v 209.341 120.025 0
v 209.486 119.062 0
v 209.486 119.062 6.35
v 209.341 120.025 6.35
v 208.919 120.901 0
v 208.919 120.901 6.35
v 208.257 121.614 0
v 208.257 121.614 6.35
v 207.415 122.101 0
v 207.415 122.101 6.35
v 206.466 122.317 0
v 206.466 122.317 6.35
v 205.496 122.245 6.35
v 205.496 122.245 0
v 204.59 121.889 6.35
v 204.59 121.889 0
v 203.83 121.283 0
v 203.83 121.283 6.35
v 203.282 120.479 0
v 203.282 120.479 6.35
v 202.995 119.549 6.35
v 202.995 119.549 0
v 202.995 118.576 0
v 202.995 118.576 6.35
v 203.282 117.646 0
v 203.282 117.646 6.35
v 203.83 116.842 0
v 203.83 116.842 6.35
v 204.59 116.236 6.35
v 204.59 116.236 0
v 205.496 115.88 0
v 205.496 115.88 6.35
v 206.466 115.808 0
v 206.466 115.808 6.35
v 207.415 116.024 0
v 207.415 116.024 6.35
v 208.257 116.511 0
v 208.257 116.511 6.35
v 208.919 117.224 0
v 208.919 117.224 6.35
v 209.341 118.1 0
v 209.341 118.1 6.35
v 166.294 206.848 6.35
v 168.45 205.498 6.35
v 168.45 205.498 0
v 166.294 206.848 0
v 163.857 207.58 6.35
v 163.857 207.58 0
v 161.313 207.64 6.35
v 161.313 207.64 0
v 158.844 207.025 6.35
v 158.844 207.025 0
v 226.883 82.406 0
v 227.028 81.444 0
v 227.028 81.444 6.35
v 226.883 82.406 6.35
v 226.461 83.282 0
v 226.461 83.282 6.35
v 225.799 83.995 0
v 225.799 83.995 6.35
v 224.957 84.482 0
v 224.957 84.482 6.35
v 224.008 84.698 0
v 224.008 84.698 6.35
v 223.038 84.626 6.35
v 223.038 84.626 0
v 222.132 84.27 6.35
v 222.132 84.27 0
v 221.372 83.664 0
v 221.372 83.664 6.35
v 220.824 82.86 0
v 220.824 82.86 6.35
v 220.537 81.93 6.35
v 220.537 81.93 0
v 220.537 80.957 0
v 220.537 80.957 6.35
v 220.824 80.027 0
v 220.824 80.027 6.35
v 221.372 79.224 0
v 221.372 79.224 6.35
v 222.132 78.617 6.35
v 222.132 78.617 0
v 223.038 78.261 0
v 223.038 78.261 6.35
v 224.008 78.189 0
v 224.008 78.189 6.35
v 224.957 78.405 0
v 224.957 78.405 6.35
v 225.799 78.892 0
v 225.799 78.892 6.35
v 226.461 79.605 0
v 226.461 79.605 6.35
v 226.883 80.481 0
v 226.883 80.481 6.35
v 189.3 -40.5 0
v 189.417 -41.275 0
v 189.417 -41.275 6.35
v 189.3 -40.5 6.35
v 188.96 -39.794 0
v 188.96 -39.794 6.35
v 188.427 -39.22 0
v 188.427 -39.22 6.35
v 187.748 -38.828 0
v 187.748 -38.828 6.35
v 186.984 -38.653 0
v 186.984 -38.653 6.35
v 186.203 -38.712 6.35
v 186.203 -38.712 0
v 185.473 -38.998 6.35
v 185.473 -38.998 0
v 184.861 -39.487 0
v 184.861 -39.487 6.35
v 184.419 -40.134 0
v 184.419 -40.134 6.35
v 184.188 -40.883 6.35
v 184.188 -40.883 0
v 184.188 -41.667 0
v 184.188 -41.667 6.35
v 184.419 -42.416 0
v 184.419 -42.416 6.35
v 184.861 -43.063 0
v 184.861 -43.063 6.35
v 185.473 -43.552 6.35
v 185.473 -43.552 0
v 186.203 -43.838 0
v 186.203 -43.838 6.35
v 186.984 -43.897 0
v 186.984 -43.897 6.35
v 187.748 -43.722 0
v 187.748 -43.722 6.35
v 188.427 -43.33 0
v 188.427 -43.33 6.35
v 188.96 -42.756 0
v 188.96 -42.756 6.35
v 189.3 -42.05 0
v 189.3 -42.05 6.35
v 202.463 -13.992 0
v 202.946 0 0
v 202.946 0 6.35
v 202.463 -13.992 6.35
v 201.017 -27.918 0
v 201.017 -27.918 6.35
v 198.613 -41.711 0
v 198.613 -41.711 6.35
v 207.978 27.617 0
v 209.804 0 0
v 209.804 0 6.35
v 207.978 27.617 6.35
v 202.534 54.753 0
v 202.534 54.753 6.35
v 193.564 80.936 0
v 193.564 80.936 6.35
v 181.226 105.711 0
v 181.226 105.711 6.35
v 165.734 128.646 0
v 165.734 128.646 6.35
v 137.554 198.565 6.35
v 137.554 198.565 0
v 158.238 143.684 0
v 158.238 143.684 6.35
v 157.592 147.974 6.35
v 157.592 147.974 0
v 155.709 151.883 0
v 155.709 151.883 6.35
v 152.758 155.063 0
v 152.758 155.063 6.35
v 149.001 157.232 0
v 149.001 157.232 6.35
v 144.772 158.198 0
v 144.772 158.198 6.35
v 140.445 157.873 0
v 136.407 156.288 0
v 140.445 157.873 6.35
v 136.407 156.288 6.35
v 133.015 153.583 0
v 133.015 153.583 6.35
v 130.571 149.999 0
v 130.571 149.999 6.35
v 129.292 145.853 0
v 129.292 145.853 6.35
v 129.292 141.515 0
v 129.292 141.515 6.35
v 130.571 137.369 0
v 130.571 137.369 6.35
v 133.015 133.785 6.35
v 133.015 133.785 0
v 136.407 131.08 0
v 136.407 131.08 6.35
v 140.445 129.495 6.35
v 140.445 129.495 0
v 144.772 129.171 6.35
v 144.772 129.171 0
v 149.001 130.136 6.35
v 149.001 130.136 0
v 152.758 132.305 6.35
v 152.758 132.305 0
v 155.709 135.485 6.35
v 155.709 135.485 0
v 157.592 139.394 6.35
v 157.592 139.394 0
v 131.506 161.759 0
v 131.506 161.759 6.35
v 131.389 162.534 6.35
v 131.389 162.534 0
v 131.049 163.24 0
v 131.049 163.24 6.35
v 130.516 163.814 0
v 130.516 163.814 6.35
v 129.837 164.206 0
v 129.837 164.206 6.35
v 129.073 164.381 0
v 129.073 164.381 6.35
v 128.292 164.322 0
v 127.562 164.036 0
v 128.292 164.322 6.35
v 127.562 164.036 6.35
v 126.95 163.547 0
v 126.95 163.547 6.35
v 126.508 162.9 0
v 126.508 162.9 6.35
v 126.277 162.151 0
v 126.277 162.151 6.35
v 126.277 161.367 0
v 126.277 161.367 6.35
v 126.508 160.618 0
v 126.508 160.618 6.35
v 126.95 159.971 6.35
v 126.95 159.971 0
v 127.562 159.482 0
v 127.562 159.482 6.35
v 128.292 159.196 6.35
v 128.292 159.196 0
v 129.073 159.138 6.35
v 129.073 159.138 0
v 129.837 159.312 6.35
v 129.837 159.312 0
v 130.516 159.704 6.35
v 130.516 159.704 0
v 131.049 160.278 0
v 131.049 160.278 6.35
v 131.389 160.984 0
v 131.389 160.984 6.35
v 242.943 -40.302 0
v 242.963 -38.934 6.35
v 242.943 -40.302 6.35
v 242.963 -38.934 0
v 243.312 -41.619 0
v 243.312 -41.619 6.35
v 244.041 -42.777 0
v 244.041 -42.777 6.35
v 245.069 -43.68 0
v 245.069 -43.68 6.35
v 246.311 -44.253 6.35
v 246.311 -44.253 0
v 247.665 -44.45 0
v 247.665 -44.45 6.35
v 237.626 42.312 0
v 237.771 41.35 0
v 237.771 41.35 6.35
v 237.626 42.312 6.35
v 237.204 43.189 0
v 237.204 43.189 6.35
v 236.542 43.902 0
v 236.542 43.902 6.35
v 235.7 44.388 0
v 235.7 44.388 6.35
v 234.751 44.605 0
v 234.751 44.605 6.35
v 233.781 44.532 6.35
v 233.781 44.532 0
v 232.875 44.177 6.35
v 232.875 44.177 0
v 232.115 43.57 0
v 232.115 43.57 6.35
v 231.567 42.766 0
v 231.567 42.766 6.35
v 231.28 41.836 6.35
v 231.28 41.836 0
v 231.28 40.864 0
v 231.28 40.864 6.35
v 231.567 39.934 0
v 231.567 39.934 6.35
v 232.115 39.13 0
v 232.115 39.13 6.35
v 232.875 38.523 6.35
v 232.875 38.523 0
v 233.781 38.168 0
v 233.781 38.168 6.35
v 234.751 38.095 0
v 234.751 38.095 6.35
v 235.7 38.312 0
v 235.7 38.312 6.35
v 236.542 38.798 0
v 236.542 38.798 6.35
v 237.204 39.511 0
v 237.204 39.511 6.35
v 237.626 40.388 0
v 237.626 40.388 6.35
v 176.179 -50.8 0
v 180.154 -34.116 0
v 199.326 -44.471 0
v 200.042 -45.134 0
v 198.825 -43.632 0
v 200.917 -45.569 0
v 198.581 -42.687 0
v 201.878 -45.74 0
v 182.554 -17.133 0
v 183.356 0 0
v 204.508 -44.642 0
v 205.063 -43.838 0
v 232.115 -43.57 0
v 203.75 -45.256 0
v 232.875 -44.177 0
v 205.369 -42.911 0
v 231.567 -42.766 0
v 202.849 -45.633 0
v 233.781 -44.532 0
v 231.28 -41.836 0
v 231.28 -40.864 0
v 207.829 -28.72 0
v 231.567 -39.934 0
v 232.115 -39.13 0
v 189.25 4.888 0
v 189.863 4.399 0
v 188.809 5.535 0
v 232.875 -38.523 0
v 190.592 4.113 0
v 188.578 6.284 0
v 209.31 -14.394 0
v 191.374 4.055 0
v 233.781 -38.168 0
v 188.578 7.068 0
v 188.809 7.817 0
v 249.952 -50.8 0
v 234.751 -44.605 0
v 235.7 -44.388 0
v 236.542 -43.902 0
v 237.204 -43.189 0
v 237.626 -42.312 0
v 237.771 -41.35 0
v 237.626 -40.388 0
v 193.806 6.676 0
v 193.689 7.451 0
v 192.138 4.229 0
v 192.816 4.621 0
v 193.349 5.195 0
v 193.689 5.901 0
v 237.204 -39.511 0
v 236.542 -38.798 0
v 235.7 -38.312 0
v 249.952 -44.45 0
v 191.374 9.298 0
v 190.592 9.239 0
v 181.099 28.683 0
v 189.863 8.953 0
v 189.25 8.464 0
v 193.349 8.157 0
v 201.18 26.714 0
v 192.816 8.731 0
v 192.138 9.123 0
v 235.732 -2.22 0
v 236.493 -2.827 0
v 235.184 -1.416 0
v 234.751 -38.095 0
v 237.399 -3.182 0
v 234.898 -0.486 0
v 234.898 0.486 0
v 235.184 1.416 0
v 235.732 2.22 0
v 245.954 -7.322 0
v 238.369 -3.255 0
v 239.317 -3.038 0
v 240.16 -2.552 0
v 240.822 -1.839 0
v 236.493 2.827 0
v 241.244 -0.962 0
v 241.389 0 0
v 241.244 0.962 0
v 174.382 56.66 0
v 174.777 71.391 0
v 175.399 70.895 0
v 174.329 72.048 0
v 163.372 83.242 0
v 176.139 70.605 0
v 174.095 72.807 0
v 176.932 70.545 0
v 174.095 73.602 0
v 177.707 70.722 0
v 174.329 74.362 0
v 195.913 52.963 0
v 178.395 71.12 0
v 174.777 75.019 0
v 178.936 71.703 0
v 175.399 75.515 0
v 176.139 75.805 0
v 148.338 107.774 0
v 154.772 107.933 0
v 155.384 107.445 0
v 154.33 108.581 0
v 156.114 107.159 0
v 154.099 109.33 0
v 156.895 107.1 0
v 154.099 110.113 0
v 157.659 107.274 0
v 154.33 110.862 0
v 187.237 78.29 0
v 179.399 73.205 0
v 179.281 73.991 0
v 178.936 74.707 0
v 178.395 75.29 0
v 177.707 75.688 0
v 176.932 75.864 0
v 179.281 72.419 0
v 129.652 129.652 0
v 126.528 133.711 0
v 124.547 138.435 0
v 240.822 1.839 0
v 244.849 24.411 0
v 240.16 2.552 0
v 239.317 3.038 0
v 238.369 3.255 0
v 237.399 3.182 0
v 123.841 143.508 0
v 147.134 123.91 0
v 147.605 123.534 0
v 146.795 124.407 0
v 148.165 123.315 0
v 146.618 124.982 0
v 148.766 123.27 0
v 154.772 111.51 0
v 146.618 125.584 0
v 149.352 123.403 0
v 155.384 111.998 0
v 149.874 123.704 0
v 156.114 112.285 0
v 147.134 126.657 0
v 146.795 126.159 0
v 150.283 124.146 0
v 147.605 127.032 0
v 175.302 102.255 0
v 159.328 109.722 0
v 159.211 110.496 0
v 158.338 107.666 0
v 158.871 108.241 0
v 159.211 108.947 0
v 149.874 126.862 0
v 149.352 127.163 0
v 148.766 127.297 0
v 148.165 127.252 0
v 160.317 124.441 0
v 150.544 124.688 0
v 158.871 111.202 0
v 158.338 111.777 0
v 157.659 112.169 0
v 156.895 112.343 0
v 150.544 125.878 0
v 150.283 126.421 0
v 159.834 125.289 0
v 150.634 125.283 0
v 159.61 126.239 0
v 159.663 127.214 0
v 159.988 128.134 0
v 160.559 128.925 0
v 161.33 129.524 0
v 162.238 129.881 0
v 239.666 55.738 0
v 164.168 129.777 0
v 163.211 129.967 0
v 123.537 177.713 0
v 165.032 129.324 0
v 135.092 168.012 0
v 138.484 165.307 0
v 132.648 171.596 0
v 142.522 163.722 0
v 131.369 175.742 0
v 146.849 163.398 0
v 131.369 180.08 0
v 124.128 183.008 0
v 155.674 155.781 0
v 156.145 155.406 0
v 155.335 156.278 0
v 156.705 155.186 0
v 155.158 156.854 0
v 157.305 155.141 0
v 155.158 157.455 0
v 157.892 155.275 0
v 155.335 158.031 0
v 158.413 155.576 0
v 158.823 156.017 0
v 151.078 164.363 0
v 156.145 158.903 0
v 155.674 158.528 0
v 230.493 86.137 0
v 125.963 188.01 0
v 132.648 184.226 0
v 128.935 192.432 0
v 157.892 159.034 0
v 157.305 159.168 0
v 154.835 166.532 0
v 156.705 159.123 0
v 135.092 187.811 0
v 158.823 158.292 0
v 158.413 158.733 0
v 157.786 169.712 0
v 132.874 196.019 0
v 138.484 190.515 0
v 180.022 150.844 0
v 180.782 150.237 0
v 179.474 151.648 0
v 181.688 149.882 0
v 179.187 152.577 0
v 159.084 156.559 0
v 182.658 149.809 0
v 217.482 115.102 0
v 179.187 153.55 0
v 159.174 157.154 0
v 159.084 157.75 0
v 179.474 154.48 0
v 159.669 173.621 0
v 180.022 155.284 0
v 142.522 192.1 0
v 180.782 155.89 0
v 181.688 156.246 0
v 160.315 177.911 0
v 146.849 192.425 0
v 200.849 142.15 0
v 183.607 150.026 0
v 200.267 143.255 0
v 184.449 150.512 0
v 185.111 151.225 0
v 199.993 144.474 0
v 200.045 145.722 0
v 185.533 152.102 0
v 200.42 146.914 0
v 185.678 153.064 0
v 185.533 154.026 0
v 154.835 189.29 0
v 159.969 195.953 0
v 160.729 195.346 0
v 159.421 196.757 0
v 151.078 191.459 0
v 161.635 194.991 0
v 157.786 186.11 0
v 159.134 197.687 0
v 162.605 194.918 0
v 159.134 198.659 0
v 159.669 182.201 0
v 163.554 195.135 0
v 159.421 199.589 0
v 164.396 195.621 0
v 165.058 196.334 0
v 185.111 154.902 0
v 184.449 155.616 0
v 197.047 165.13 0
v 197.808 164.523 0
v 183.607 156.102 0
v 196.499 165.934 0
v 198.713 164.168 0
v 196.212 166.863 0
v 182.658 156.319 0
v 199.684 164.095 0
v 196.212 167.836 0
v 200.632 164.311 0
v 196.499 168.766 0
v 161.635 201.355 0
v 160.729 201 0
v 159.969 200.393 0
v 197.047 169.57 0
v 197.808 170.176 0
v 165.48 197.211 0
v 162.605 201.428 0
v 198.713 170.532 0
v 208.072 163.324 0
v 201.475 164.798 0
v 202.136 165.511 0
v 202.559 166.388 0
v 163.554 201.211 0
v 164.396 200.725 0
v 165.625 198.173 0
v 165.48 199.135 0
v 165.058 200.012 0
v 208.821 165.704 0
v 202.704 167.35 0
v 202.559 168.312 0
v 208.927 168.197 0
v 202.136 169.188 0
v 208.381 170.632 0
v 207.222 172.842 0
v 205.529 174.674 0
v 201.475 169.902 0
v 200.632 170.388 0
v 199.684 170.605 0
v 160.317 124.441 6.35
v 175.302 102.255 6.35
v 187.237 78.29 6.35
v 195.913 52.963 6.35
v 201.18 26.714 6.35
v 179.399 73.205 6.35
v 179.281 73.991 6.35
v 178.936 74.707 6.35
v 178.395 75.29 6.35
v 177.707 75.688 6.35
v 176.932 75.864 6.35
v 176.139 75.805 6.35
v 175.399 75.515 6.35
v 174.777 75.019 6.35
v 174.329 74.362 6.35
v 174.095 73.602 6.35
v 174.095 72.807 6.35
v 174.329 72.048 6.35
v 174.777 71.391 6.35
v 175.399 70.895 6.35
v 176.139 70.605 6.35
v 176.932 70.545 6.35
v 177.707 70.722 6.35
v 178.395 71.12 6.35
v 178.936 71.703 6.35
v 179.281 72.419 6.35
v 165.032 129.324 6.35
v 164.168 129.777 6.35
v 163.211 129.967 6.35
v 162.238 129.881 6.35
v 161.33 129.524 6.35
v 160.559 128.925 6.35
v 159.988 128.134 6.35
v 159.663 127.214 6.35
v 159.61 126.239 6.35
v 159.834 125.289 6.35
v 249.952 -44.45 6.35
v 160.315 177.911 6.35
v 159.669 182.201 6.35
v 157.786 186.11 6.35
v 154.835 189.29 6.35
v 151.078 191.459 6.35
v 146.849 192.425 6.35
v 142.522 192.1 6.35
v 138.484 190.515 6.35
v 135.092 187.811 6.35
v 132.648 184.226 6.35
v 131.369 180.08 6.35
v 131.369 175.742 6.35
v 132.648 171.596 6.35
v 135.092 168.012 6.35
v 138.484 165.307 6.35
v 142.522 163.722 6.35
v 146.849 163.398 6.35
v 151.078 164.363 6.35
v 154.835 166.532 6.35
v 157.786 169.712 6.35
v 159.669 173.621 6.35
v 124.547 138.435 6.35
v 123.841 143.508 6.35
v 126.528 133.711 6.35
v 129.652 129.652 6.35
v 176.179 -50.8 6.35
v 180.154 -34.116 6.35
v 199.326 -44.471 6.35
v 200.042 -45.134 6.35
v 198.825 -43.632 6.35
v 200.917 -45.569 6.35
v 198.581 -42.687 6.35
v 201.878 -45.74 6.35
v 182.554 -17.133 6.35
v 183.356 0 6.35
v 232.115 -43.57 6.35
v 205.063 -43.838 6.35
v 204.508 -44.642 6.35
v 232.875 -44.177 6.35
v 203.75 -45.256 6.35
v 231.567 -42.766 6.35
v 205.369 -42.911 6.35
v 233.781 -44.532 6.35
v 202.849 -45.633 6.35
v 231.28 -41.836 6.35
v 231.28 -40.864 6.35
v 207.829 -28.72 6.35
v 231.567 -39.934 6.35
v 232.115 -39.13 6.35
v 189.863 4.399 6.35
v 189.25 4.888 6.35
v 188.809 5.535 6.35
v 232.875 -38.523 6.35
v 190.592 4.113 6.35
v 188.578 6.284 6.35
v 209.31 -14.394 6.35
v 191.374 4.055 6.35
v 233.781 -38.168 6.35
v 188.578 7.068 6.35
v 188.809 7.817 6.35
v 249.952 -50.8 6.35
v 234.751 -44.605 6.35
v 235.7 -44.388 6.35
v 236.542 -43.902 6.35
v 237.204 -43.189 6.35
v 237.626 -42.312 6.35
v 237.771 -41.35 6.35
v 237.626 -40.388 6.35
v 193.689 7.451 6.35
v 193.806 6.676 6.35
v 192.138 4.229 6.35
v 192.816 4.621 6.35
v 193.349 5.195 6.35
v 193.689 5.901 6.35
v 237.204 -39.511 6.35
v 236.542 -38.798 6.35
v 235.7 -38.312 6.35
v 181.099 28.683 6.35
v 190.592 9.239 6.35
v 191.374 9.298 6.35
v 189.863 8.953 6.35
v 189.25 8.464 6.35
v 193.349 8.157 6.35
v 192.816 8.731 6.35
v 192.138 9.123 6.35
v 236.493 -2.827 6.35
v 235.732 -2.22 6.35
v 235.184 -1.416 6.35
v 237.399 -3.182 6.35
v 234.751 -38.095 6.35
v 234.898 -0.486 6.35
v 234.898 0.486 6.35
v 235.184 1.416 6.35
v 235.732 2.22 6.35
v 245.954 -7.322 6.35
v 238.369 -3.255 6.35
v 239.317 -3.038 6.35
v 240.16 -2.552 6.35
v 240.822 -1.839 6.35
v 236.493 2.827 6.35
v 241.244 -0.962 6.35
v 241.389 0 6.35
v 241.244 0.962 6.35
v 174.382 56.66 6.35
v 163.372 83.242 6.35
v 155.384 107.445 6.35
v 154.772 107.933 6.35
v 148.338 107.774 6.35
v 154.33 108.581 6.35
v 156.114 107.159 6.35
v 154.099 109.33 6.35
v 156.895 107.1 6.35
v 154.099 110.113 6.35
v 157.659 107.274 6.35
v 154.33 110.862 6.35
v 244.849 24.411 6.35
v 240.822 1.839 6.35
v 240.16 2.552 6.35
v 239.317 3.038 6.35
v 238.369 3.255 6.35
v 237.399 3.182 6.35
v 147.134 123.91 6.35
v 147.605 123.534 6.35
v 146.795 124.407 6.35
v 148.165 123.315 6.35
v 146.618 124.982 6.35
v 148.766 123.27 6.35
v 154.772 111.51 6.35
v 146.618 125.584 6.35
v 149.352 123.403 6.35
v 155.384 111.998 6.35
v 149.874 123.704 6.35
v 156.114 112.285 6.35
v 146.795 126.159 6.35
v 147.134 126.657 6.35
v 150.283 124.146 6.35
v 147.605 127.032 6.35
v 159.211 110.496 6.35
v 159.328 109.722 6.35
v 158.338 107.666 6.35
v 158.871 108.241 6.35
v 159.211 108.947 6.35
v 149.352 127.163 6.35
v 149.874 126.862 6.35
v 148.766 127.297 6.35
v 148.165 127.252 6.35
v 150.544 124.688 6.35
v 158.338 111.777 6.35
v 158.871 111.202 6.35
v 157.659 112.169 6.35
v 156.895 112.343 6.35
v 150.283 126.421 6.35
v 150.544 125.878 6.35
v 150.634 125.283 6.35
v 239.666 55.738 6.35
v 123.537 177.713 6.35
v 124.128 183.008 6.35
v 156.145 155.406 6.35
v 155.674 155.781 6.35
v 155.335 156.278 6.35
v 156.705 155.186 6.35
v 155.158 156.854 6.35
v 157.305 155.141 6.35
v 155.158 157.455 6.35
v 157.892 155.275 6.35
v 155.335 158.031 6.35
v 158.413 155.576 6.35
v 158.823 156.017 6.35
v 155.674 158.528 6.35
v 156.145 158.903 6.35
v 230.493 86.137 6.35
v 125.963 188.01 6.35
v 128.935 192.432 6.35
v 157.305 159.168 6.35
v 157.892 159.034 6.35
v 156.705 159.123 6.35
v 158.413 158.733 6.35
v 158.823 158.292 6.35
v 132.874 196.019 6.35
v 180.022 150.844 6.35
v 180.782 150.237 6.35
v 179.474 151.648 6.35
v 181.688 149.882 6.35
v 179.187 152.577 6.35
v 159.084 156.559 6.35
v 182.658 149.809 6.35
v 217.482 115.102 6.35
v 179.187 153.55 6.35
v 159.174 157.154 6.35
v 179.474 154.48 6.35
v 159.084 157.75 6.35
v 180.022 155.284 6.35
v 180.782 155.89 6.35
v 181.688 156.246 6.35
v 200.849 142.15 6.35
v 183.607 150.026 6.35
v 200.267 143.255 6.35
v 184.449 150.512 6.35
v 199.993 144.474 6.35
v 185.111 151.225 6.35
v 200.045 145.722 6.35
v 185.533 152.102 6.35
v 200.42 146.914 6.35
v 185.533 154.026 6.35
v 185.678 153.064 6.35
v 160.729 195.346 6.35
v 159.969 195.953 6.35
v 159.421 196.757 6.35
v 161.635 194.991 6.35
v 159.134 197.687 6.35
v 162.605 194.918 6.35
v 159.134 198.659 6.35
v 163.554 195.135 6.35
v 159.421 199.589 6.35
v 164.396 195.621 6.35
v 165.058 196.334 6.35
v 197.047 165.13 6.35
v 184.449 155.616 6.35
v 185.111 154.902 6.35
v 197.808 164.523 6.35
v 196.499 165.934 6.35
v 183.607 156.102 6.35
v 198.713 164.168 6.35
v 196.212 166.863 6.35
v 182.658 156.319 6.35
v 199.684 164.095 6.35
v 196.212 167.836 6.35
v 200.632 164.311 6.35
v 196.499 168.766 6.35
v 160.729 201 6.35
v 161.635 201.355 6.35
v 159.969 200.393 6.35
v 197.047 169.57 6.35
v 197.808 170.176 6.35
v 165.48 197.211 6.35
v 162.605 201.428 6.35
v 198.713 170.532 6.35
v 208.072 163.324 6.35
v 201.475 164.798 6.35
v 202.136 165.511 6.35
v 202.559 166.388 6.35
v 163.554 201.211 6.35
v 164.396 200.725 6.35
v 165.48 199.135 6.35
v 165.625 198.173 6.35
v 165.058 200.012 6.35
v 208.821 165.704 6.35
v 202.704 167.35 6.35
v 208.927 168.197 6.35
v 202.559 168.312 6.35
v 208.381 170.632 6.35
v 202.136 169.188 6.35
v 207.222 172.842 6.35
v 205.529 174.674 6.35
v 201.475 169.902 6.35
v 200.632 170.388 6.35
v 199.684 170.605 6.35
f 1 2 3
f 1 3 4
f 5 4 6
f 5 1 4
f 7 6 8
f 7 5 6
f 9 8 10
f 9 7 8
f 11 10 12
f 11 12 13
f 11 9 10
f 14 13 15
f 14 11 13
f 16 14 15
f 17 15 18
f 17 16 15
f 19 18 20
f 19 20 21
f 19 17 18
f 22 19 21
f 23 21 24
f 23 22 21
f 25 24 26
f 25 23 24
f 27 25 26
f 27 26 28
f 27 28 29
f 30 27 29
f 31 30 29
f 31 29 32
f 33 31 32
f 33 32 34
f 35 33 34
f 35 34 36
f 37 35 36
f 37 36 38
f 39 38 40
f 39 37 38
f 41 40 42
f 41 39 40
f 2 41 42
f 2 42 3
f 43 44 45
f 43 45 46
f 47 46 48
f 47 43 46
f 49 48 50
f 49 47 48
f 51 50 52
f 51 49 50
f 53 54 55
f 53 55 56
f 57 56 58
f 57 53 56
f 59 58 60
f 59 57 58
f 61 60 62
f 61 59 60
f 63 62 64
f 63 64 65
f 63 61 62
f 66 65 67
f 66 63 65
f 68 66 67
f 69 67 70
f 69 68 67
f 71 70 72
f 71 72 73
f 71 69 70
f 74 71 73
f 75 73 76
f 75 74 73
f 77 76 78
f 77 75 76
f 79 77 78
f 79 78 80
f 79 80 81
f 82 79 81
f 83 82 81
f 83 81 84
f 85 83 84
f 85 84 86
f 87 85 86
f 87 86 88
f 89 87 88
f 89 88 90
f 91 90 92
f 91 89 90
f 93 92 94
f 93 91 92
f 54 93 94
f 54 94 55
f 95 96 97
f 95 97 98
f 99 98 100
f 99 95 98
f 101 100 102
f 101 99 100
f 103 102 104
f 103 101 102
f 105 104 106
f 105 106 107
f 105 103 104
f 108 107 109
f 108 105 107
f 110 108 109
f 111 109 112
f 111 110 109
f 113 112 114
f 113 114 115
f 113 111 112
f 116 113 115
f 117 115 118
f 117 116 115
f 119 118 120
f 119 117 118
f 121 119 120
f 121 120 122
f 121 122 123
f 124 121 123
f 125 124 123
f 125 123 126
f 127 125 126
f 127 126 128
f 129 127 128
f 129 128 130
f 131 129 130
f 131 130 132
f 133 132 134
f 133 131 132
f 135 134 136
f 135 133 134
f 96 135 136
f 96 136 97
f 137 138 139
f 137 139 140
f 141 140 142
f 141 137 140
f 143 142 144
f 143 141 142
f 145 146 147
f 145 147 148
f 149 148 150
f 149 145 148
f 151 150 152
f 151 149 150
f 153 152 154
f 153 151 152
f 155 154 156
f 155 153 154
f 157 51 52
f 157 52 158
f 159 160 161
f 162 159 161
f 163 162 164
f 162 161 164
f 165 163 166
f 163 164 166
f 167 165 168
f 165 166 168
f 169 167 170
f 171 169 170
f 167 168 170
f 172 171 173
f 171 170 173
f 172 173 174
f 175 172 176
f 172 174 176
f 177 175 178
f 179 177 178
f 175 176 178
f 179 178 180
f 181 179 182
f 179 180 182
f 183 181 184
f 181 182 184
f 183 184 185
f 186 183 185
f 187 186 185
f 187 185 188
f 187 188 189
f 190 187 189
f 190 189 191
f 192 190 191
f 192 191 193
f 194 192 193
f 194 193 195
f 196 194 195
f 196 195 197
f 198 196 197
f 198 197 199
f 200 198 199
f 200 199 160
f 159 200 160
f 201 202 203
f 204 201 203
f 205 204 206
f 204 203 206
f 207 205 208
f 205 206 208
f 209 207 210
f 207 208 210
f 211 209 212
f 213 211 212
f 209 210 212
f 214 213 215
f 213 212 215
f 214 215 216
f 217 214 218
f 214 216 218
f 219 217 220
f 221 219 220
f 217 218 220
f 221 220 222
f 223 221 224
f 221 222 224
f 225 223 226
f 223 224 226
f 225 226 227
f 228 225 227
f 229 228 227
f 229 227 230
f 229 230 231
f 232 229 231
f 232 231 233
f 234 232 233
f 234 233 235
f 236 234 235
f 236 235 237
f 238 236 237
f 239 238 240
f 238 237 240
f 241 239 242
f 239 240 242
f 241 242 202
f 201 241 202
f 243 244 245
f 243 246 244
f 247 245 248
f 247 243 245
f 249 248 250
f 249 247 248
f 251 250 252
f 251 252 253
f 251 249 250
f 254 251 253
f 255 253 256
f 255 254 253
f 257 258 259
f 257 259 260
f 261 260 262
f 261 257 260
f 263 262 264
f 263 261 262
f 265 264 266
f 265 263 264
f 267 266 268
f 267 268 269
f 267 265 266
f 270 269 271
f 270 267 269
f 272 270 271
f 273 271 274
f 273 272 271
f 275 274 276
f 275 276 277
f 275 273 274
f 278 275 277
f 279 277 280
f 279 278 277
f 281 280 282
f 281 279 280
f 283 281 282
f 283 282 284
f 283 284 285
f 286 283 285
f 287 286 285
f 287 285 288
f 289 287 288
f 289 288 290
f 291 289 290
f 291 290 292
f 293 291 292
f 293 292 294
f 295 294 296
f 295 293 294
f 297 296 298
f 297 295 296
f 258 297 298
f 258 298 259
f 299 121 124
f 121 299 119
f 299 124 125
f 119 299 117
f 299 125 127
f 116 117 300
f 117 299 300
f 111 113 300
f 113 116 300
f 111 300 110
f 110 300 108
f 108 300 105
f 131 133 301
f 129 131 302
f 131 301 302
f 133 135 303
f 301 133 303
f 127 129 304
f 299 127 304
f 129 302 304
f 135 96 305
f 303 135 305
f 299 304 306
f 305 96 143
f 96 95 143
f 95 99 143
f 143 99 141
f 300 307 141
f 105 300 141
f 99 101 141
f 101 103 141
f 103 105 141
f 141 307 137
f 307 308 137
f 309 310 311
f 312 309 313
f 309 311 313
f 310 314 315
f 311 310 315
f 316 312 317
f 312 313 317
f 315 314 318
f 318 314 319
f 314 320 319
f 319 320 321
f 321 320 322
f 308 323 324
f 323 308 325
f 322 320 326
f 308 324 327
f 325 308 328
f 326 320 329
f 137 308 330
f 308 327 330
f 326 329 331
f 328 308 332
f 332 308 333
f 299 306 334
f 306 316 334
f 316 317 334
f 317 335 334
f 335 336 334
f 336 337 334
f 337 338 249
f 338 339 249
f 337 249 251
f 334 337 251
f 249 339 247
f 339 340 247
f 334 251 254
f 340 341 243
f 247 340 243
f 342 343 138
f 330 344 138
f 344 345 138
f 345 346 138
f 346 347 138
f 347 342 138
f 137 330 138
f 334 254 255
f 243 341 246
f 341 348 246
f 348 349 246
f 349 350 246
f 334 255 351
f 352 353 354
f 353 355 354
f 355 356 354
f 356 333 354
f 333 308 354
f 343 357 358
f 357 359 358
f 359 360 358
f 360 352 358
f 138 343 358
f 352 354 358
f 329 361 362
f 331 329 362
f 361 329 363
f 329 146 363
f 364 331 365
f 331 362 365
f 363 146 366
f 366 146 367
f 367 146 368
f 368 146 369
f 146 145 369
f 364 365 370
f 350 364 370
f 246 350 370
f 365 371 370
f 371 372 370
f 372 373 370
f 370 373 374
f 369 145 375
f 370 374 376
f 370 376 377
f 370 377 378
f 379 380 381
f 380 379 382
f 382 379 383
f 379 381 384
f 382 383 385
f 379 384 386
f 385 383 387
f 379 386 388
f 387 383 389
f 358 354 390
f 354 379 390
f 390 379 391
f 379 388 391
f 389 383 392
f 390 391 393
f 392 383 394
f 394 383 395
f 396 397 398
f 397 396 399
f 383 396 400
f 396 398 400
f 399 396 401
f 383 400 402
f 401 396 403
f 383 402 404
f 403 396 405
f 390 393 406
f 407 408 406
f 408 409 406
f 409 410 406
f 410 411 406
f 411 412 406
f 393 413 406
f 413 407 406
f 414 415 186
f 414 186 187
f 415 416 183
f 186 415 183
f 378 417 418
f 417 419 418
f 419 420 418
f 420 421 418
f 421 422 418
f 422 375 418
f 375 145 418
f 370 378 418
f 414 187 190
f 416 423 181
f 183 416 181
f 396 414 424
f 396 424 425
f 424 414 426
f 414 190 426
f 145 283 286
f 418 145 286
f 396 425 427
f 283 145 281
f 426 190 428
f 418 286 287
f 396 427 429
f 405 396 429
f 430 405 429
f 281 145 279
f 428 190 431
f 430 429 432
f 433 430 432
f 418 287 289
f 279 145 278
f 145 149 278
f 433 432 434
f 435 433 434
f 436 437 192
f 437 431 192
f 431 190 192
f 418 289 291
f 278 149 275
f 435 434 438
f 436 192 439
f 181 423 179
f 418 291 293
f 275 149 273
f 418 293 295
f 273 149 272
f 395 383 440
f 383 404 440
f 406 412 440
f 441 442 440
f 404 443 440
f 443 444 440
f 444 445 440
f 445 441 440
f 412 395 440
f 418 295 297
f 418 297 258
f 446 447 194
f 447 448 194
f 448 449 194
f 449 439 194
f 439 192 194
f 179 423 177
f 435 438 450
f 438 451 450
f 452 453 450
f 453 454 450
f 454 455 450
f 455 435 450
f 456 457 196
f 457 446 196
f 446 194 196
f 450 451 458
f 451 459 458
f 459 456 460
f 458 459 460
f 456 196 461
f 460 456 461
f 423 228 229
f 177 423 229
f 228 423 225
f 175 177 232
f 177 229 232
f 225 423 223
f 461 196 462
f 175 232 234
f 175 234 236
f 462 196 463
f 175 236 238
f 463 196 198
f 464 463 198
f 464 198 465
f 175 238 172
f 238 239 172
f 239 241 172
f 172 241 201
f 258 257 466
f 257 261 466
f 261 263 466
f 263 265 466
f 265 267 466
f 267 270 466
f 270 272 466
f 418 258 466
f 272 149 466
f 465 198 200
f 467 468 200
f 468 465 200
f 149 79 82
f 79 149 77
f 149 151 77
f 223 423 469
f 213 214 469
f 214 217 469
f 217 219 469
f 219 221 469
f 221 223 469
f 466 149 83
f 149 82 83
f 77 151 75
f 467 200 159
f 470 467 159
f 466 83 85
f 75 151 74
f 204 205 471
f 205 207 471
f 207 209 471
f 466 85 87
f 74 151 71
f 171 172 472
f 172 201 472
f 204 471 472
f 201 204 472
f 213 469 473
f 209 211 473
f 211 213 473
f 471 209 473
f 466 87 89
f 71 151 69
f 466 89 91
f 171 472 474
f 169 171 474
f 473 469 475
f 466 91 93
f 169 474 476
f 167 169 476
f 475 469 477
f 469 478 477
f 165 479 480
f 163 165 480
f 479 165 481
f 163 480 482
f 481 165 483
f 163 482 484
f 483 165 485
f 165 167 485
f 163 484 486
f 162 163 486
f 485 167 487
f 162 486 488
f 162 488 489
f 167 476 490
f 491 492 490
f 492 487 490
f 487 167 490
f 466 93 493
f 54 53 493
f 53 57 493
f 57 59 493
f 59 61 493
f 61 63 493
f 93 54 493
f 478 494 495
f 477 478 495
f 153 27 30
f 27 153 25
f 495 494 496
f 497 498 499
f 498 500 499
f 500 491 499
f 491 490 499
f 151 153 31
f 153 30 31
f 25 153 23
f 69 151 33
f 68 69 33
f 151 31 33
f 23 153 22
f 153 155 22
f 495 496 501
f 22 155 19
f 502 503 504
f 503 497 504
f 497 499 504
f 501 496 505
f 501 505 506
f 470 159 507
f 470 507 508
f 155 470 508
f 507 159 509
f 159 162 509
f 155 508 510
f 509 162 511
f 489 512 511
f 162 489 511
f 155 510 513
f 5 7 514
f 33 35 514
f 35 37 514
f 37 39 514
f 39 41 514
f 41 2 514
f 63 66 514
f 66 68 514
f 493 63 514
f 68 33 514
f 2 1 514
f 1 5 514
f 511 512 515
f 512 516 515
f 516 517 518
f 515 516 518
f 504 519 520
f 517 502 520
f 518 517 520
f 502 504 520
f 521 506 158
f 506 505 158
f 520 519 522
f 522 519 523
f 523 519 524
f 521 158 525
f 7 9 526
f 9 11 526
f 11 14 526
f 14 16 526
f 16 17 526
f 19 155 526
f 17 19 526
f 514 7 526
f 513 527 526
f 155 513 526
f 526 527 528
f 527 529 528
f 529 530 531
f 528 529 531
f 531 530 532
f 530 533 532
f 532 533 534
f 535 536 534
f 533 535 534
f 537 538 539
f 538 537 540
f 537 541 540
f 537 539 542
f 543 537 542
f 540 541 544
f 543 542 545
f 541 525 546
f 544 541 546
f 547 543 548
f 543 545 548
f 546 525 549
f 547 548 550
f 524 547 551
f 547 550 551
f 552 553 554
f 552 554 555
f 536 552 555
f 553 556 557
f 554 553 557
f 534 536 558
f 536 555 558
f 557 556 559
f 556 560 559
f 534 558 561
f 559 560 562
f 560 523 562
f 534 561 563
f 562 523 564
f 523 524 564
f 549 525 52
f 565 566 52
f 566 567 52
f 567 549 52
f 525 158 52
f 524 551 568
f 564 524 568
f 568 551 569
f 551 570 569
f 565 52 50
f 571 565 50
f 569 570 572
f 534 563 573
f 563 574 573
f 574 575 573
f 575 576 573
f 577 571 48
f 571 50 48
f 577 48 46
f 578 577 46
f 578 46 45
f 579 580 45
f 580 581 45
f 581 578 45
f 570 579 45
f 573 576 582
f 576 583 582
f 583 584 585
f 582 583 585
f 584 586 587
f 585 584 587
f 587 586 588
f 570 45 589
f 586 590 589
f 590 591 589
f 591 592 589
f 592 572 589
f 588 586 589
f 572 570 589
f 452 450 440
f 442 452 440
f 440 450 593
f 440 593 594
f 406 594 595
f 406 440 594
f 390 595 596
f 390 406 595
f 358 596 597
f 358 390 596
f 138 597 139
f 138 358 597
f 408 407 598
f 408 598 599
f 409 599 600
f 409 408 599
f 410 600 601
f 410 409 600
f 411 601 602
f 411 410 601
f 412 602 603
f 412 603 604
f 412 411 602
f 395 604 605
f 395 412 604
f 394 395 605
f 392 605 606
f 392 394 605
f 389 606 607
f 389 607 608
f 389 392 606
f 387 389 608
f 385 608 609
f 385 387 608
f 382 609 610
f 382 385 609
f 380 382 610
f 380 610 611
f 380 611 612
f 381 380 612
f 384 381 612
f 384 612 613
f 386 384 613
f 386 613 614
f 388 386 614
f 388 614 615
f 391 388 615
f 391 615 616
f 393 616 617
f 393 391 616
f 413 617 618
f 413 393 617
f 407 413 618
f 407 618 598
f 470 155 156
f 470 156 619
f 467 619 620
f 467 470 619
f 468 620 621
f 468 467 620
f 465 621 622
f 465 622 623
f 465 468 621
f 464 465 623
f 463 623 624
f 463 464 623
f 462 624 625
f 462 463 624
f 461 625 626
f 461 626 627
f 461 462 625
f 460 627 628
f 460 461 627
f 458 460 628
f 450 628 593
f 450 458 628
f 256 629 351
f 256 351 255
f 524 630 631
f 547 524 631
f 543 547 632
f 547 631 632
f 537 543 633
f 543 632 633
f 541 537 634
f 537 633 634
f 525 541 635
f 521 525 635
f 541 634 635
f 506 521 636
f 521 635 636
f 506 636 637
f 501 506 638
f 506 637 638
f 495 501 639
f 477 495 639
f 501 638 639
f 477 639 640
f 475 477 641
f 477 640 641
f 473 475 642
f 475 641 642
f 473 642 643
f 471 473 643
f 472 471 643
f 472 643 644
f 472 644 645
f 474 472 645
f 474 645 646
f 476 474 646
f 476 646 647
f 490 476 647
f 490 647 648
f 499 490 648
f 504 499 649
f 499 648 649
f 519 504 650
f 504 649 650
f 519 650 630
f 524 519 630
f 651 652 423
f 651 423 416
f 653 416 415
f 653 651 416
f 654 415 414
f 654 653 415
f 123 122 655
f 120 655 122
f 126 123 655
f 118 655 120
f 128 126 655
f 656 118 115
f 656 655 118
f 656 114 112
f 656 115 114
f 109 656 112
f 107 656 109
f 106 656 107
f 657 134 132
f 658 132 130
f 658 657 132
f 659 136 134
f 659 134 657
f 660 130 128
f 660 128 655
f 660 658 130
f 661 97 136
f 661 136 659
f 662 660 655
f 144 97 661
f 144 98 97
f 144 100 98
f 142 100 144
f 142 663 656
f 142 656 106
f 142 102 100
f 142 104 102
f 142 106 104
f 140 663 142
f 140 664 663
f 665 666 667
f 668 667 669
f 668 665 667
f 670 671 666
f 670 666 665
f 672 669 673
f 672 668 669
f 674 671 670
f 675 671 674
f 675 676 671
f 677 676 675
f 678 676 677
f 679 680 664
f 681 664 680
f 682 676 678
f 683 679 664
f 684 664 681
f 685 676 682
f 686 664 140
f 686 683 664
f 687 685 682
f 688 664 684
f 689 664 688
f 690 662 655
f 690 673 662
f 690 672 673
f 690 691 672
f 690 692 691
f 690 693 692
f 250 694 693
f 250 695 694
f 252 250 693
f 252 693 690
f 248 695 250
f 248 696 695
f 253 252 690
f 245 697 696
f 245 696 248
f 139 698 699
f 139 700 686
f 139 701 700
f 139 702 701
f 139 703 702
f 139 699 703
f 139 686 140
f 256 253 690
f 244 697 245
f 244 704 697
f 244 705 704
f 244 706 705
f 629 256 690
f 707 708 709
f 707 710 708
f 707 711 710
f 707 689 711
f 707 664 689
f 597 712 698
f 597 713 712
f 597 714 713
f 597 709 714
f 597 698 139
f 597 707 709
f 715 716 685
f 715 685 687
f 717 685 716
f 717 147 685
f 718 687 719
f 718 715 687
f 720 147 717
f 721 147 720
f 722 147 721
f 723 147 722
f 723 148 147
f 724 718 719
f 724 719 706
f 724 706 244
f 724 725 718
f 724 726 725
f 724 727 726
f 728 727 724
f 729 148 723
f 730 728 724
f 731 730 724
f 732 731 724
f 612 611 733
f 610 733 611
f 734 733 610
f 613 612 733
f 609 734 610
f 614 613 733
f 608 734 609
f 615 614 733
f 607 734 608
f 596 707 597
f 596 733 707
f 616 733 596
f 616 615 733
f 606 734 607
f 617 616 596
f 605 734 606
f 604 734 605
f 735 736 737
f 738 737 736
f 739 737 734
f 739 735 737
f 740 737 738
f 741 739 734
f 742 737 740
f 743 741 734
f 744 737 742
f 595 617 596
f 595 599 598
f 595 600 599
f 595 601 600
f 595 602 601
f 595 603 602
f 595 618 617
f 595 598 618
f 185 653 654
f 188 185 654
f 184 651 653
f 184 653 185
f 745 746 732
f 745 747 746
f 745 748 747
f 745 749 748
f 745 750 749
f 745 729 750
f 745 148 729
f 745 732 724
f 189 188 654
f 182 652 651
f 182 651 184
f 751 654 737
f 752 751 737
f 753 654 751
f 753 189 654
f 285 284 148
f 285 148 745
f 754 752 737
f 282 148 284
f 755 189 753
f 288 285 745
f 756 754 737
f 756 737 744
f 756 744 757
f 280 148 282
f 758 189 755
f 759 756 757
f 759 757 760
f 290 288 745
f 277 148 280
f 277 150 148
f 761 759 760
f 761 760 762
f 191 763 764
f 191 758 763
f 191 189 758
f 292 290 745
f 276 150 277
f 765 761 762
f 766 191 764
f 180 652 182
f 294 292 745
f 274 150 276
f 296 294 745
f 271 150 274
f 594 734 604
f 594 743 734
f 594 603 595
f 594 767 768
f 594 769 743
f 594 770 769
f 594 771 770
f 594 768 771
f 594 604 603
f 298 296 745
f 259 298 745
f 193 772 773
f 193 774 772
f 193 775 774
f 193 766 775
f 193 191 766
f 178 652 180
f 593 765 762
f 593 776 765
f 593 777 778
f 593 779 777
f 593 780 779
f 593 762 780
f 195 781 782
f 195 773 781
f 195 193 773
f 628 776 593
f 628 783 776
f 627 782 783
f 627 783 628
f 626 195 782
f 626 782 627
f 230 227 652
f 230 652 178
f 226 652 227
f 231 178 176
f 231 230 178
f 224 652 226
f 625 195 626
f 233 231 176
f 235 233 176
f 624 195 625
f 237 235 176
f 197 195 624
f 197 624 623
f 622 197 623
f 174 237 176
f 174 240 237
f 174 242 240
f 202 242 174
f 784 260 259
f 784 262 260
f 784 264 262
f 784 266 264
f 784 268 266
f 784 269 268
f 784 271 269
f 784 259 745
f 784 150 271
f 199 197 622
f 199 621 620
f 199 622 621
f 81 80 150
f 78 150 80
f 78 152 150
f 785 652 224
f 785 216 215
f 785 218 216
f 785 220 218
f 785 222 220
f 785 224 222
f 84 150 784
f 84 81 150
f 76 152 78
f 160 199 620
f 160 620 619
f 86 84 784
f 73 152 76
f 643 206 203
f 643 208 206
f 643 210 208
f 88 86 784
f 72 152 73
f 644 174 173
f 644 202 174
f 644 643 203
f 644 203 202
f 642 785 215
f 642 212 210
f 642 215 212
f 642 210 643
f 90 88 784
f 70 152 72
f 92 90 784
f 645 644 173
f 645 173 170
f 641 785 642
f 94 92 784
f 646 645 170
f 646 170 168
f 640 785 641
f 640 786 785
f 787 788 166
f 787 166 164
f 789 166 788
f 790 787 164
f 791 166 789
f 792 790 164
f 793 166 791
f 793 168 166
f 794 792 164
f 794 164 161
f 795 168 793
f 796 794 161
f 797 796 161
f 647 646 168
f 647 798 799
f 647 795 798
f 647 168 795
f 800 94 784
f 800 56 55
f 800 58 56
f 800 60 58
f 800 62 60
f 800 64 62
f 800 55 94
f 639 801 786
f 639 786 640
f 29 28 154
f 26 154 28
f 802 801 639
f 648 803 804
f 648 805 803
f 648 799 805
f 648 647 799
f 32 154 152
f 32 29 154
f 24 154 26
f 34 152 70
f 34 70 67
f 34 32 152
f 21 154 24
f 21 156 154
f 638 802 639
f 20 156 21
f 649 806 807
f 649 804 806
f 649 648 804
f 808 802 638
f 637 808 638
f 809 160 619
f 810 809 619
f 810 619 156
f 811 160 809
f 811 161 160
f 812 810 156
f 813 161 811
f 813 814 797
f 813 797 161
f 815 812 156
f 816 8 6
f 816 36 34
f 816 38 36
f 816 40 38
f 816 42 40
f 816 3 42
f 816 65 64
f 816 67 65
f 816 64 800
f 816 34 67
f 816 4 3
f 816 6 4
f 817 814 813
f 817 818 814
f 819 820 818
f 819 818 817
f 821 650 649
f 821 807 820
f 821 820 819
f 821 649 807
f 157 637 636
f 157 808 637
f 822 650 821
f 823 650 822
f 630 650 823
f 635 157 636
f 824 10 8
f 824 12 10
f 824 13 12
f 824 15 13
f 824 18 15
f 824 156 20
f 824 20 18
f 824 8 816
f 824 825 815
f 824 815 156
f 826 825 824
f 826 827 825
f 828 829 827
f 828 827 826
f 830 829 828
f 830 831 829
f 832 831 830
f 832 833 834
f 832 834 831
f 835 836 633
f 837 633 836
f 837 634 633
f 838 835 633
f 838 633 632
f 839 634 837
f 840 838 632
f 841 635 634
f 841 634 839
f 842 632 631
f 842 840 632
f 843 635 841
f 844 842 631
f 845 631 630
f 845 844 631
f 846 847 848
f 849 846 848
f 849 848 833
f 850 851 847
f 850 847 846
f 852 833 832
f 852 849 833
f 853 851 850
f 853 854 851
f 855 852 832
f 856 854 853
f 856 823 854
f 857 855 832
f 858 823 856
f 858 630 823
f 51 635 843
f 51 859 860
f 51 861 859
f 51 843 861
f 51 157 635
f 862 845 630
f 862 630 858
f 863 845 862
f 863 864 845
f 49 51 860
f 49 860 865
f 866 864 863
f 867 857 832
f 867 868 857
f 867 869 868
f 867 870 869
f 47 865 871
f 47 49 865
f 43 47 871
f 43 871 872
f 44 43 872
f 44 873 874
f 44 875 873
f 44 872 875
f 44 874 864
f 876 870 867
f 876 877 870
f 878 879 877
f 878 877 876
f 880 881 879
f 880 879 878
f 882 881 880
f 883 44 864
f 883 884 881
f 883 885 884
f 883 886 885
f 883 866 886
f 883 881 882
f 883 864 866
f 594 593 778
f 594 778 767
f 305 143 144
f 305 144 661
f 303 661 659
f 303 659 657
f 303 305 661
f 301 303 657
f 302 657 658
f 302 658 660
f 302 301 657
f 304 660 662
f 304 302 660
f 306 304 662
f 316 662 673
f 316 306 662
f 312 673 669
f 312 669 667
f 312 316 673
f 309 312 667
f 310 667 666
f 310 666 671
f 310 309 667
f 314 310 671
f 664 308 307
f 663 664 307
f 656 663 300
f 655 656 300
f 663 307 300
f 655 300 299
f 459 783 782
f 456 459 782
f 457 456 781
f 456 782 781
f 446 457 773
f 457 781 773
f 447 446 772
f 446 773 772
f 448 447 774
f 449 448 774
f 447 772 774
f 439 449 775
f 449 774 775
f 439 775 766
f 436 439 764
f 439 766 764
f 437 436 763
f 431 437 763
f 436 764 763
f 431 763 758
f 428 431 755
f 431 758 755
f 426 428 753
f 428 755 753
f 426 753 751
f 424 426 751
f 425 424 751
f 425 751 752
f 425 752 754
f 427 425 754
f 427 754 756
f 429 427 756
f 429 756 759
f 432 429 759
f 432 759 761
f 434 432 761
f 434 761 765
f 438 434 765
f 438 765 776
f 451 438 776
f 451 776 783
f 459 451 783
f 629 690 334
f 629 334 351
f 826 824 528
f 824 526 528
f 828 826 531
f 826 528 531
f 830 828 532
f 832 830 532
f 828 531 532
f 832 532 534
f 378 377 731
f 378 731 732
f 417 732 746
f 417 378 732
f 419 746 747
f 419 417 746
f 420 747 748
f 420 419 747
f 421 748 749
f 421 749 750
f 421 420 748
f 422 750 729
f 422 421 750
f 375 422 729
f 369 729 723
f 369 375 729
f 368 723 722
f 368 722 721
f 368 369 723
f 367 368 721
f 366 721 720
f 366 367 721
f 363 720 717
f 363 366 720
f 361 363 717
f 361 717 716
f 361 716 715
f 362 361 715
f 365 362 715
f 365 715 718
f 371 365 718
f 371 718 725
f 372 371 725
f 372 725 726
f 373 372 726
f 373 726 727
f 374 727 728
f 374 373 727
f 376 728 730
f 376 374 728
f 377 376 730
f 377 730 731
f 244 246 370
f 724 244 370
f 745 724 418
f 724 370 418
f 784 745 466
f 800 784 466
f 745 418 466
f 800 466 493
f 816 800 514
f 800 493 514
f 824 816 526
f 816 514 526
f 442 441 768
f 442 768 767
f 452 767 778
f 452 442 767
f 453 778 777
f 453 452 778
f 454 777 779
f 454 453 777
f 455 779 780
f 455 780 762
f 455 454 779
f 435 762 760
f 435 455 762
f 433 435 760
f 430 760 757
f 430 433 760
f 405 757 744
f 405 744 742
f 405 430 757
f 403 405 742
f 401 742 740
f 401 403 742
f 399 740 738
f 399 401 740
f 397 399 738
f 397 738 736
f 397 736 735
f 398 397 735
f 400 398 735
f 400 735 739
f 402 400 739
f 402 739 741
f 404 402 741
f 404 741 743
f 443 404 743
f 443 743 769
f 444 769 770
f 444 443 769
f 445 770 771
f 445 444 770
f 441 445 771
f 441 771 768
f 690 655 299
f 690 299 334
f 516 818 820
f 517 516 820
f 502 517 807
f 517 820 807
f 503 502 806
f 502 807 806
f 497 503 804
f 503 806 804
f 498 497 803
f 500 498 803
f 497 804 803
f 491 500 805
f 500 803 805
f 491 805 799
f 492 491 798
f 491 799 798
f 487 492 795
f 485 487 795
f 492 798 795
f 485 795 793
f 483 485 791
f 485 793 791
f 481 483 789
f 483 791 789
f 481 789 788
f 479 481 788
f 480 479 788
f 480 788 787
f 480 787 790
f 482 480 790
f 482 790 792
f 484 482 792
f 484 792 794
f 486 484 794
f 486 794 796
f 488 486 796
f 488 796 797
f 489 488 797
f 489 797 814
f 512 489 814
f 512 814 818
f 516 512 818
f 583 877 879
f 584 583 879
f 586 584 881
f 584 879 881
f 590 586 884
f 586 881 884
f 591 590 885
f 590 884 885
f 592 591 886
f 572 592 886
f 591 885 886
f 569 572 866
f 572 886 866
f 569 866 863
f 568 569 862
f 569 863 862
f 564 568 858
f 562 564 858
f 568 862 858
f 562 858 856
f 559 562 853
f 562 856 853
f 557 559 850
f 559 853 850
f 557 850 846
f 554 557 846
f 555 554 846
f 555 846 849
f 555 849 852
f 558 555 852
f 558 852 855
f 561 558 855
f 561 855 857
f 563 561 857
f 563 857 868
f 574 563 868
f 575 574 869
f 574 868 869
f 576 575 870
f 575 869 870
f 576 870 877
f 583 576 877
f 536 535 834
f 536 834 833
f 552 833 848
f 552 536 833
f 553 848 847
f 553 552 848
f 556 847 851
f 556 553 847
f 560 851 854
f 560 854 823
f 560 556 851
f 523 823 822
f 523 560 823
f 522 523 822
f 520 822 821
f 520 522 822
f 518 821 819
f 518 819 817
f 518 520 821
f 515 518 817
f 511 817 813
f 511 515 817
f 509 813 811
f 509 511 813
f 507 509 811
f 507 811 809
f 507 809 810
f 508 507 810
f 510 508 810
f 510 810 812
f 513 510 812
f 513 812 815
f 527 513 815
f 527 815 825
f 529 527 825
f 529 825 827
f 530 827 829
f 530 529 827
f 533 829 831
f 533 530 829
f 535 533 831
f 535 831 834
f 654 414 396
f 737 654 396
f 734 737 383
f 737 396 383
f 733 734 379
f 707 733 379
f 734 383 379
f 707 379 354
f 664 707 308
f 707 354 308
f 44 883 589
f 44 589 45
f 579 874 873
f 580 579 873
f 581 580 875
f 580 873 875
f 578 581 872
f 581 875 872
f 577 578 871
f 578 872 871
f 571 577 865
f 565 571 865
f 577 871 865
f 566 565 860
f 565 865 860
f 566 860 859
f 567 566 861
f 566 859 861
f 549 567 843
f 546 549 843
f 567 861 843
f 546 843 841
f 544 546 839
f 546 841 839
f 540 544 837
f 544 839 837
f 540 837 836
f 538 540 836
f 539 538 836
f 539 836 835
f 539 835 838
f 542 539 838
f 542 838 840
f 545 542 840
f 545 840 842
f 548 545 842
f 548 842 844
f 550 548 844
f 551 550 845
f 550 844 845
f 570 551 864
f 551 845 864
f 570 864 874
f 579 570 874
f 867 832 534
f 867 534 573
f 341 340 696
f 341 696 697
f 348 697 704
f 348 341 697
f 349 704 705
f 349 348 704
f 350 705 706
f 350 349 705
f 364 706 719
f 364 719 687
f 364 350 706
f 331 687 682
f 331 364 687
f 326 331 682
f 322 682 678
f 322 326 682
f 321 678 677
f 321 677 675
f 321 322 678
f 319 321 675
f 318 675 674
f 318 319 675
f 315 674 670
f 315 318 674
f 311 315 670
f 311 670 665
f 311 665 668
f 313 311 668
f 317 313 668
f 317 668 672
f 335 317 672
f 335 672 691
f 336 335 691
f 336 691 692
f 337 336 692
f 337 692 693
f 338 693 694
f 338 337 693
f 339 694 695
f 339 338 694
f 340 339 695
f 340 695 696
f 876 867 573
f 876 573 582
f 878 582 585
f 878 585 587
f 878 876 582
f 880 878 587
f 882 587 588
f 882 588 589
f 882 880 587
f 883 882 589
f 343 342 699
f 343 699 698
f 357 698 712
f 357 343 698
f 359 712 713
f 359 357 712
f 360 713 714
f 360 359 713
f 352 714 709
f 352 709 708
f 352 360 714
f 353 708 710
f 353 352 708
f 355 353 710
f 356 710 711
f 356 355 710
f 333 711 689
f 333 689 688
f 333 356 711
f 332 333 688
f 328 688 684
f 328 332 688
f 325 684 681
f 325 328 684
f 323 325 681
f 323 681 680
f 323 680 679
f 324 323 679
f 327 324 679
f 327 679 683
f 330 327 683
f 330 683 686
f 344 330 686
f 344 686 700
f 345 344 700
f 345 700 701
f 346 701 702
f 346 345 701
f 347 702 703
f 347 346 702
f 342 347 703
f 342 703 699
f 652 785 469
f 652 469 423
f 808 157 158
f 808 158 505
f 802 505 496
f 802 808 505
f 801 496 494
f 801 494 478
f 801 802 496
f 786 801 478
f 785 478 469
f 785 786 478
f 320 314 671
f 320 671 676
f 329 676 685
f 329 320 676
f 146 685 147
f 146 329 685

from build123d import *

# Parameters (mm, degrees)
SKETCH1_R           = 2.6289
SKETCH1_R_2         = 2.667
SKETCH1_R_3         = 3.2639
BOSS_EXTRUDE1_DEPTH = 6.35
SKETCH3_R           = 14.5542
SKETCH3_R_2         = 3.2639
SKETCH3_R_3         = 2.6289
BOSS_EXTRUDE2_DEPTH = 6.35
SKETCH4_R           = 14.5542
SKETCH4_R_2         = 2.0193
CUT_EXTRUDE1_DEPTH  = 7.35
BOSS_EXTRUDE3_DEPTH = 6.35
FILLET1_R           = 4.7625
FILLET2_R           = 4.7625


with BuildPart() as part:
    # Sketch1 → Boss-Extrude1 (new body)
    with BuildSketch(Plane.XY):
        with BuildLine():
            Line((176.178529946, -50.8), (240.761529124, -50.8))
            ThreePointArc((240.761529124, -50.8), (235.877364624, 70.061564101), (173.992462346, 173.992462346))
            Line((173.992462346, 173.992462346), (129.652447748, 129.652447748))
            ThreePointArc((129.652447748, 129.652447748), (169.399086533, 70.167399096), (183.35625, 0))
            ThreePointArc((183.35625, 0), (181.552952325, -25.652288715), (176.178529946, -50.8))
        make_face()
        with Locations((191.177219016, 6.676055597)):
            Circle(SKETCH1_R, mode=Mode.SUBTRACT)
        with Locations((156.698666372, 109.721587421)):
            Circle(SKETCH1_R, mode=Mode.SUBTRACT)
        with Locations((176.732380322, 73.20494884)):
            Circle(SKETCH1_R_2, mode=Mode.SUBTRACT)
        with Locations((186.787775735, -41.275)):
            Circle(SKETCH1_R, mode=Mode.SUBTRACT)
        with Locations((238.125, 0)):
            Circle(SKETCH1_R_3, mode=Mode.SUBTRACT)
        with Locations((234.507346186, 41.349972307)):
            Circle(SKETCH1_R_3, mode=Mode.SUBTRACT)
        with Locations((223.764305325, 81.443546629)):
            Circle(SKETCH1_R_3, mode=Mode.SUBTRACT)
        with Locations((206.222299276, 119.0625)):
            Circle(SKETCH1_R_3, mode=Mode.SUBTRACT)
        with Locations((182.414333018, 153.063799557)):
            Circle(SKETCH1_R_3, mode=Mode.SUBTRACT)
        with Locations((234.507346186, -41.349972307)):
            Circle(SKETCH1_R_3, mode=Mode.SUBTRACT)
        with BuildLine():
            ThreePointArc((202.946, 0), (201.859935486, -20.967721902), (198.61336608, -41.711026485))
            ThreePointArc((198.61336608, -41.711026485), (201.391341659, -45.688667392), (205.368929989, -42.910616532))
            ThreePointArc((205.368929989, -42.910616532), (208.692287116, -21.569601625), (209.804, 0))
            ThreePointArc((209.804, 0), (198.481076932, 67.99250338), (165.734482585, 128.646024805))
            ThreePointArc((165.734482585, 128.646024805), (160.923178893, 129.252192093), (160.317011605, 124.440888401))
            ThreePointArc((160.317011605, 124.440888401), (191.993196693, 65.769988136), (202.946, 0))
        make_face(mode=Mode.SUBTRACT)
    extrude(amount=BOSS_EXTRUDE1_DEPTH)

    # Sketch3 → Boss-Extrude2 (add)
    with BuildSketch(Plane.XY.offset(6.35)):
        with BuildLine():
            Line((129.652447748, 129.652447748), (161.644610179, 161.644610179))
            Line((161.644610179, 161.644610179), (173.992462346, 173.992462346))
            ThreePointArc((173.992462346, 173.992462346), (187.203995727, 159.691633751), (199.243521921, 144.391041546))
            Line((199.243521921, 144.391041546), (208.072252438, 163.324315239))
            ThreePointArc((208.072252438, 163.324315239), (208.734128286, 169.432705073), (205.528624059, 174.674388835))
            Line((205.528624059, 174.674388835), (168.450190134, 205.497612521))
            ThreePointArc((168.450190134, 205.497612521), (163.856747392, 207.579840958), (158.844030643, 207.024807371))
            Line((158.844030643, 207.024807371), (137.554097629, 198.565416651))
            ThreePointArc((137.554097629, 198.565416651), (127.316076149, 190.310286973), (123.536791738, 177.713411997))
            Line((123.536791738, 177.713411997), (123.841133335, 143.507548105))
            ThreePointArc((123.841133335, 143.507548105), (125.38482655, 136.008742521), (129.652447748, 129.652447748))
        make_face()
        with Locations((145.760912093, 177.911147809)):
            Circle(SKETCH3_R, mode=Mode.SUBTRACT)
        with Locations((199.439670766, 167.349754182)):
            Circle(SKETCH3_R_2, mode=Mode.SUBTRACT)
        with Locations((162.361236841, 198.172977868)):
            Circle(SKETCH3_R_2, mode=Mode.SUBTRACT)
        with Locations((128.876648593, 161.759110908)):
            Circle(SKETCH3_R_3, mode=Mode.SUBTRACT)
    extrude(amount=-BOSS_EXTRUDE2_DEPTH)

    # Sketch4 → Cut-Extrude1 (cut, through all)
    with BuildSketch(Plane.XY.offset(6.35)):
        with Locations((143.684097937, 143.684097937)):
            Circle(SKETCH4_R)
        with Locations((157.154482119, 157.154482119)):
            Circle(SKETCH4_R_2)
        with Locations((148.614600746, 125.283210946)):
            Circle(SKETCH4_R_2)
    extrude(amount=-CUT_EXTRUDE1_DEPTH, mode=Mode.SUBTRACT)

    # Sketch5 → Boss-Extrude3 (add)
    with BuildSketch(Plane.XY.offset(6.35)):
        with BuildLine():
            Line((240.761529124, -50.8), (249.951861983, -50.8))
            Line((249.951861983, -50.8), (249.951861983, -44.45))
            Line((249.951861983, -44.45), (242.014361983, -44.45))
            ThreePointArc((242.014361983, -44.45), (241.408825198, -47.629119481), (240.761529124, -50.8))
        make_face()
    extrude(amount=-BOSS_EXTRUDE3_DEPTH)

    # Fillet1
    fillet1_edges = [part.edges().sort_by_distance(p)[0] for p in [
        (242.014361983, -44.45, 3.175),
    ]]
    fillet(fillet1_edges, radius=FILLET1_R)

    # Fillet2
    fillet2_edges = [part.edges().sort_by_distance(p)[0] for p in [
        (199.243521921, 144.391041546, 3.175),
    ]]
    fillet(fillet2_edges, radius=FILLET2_R)


solid = part.part
